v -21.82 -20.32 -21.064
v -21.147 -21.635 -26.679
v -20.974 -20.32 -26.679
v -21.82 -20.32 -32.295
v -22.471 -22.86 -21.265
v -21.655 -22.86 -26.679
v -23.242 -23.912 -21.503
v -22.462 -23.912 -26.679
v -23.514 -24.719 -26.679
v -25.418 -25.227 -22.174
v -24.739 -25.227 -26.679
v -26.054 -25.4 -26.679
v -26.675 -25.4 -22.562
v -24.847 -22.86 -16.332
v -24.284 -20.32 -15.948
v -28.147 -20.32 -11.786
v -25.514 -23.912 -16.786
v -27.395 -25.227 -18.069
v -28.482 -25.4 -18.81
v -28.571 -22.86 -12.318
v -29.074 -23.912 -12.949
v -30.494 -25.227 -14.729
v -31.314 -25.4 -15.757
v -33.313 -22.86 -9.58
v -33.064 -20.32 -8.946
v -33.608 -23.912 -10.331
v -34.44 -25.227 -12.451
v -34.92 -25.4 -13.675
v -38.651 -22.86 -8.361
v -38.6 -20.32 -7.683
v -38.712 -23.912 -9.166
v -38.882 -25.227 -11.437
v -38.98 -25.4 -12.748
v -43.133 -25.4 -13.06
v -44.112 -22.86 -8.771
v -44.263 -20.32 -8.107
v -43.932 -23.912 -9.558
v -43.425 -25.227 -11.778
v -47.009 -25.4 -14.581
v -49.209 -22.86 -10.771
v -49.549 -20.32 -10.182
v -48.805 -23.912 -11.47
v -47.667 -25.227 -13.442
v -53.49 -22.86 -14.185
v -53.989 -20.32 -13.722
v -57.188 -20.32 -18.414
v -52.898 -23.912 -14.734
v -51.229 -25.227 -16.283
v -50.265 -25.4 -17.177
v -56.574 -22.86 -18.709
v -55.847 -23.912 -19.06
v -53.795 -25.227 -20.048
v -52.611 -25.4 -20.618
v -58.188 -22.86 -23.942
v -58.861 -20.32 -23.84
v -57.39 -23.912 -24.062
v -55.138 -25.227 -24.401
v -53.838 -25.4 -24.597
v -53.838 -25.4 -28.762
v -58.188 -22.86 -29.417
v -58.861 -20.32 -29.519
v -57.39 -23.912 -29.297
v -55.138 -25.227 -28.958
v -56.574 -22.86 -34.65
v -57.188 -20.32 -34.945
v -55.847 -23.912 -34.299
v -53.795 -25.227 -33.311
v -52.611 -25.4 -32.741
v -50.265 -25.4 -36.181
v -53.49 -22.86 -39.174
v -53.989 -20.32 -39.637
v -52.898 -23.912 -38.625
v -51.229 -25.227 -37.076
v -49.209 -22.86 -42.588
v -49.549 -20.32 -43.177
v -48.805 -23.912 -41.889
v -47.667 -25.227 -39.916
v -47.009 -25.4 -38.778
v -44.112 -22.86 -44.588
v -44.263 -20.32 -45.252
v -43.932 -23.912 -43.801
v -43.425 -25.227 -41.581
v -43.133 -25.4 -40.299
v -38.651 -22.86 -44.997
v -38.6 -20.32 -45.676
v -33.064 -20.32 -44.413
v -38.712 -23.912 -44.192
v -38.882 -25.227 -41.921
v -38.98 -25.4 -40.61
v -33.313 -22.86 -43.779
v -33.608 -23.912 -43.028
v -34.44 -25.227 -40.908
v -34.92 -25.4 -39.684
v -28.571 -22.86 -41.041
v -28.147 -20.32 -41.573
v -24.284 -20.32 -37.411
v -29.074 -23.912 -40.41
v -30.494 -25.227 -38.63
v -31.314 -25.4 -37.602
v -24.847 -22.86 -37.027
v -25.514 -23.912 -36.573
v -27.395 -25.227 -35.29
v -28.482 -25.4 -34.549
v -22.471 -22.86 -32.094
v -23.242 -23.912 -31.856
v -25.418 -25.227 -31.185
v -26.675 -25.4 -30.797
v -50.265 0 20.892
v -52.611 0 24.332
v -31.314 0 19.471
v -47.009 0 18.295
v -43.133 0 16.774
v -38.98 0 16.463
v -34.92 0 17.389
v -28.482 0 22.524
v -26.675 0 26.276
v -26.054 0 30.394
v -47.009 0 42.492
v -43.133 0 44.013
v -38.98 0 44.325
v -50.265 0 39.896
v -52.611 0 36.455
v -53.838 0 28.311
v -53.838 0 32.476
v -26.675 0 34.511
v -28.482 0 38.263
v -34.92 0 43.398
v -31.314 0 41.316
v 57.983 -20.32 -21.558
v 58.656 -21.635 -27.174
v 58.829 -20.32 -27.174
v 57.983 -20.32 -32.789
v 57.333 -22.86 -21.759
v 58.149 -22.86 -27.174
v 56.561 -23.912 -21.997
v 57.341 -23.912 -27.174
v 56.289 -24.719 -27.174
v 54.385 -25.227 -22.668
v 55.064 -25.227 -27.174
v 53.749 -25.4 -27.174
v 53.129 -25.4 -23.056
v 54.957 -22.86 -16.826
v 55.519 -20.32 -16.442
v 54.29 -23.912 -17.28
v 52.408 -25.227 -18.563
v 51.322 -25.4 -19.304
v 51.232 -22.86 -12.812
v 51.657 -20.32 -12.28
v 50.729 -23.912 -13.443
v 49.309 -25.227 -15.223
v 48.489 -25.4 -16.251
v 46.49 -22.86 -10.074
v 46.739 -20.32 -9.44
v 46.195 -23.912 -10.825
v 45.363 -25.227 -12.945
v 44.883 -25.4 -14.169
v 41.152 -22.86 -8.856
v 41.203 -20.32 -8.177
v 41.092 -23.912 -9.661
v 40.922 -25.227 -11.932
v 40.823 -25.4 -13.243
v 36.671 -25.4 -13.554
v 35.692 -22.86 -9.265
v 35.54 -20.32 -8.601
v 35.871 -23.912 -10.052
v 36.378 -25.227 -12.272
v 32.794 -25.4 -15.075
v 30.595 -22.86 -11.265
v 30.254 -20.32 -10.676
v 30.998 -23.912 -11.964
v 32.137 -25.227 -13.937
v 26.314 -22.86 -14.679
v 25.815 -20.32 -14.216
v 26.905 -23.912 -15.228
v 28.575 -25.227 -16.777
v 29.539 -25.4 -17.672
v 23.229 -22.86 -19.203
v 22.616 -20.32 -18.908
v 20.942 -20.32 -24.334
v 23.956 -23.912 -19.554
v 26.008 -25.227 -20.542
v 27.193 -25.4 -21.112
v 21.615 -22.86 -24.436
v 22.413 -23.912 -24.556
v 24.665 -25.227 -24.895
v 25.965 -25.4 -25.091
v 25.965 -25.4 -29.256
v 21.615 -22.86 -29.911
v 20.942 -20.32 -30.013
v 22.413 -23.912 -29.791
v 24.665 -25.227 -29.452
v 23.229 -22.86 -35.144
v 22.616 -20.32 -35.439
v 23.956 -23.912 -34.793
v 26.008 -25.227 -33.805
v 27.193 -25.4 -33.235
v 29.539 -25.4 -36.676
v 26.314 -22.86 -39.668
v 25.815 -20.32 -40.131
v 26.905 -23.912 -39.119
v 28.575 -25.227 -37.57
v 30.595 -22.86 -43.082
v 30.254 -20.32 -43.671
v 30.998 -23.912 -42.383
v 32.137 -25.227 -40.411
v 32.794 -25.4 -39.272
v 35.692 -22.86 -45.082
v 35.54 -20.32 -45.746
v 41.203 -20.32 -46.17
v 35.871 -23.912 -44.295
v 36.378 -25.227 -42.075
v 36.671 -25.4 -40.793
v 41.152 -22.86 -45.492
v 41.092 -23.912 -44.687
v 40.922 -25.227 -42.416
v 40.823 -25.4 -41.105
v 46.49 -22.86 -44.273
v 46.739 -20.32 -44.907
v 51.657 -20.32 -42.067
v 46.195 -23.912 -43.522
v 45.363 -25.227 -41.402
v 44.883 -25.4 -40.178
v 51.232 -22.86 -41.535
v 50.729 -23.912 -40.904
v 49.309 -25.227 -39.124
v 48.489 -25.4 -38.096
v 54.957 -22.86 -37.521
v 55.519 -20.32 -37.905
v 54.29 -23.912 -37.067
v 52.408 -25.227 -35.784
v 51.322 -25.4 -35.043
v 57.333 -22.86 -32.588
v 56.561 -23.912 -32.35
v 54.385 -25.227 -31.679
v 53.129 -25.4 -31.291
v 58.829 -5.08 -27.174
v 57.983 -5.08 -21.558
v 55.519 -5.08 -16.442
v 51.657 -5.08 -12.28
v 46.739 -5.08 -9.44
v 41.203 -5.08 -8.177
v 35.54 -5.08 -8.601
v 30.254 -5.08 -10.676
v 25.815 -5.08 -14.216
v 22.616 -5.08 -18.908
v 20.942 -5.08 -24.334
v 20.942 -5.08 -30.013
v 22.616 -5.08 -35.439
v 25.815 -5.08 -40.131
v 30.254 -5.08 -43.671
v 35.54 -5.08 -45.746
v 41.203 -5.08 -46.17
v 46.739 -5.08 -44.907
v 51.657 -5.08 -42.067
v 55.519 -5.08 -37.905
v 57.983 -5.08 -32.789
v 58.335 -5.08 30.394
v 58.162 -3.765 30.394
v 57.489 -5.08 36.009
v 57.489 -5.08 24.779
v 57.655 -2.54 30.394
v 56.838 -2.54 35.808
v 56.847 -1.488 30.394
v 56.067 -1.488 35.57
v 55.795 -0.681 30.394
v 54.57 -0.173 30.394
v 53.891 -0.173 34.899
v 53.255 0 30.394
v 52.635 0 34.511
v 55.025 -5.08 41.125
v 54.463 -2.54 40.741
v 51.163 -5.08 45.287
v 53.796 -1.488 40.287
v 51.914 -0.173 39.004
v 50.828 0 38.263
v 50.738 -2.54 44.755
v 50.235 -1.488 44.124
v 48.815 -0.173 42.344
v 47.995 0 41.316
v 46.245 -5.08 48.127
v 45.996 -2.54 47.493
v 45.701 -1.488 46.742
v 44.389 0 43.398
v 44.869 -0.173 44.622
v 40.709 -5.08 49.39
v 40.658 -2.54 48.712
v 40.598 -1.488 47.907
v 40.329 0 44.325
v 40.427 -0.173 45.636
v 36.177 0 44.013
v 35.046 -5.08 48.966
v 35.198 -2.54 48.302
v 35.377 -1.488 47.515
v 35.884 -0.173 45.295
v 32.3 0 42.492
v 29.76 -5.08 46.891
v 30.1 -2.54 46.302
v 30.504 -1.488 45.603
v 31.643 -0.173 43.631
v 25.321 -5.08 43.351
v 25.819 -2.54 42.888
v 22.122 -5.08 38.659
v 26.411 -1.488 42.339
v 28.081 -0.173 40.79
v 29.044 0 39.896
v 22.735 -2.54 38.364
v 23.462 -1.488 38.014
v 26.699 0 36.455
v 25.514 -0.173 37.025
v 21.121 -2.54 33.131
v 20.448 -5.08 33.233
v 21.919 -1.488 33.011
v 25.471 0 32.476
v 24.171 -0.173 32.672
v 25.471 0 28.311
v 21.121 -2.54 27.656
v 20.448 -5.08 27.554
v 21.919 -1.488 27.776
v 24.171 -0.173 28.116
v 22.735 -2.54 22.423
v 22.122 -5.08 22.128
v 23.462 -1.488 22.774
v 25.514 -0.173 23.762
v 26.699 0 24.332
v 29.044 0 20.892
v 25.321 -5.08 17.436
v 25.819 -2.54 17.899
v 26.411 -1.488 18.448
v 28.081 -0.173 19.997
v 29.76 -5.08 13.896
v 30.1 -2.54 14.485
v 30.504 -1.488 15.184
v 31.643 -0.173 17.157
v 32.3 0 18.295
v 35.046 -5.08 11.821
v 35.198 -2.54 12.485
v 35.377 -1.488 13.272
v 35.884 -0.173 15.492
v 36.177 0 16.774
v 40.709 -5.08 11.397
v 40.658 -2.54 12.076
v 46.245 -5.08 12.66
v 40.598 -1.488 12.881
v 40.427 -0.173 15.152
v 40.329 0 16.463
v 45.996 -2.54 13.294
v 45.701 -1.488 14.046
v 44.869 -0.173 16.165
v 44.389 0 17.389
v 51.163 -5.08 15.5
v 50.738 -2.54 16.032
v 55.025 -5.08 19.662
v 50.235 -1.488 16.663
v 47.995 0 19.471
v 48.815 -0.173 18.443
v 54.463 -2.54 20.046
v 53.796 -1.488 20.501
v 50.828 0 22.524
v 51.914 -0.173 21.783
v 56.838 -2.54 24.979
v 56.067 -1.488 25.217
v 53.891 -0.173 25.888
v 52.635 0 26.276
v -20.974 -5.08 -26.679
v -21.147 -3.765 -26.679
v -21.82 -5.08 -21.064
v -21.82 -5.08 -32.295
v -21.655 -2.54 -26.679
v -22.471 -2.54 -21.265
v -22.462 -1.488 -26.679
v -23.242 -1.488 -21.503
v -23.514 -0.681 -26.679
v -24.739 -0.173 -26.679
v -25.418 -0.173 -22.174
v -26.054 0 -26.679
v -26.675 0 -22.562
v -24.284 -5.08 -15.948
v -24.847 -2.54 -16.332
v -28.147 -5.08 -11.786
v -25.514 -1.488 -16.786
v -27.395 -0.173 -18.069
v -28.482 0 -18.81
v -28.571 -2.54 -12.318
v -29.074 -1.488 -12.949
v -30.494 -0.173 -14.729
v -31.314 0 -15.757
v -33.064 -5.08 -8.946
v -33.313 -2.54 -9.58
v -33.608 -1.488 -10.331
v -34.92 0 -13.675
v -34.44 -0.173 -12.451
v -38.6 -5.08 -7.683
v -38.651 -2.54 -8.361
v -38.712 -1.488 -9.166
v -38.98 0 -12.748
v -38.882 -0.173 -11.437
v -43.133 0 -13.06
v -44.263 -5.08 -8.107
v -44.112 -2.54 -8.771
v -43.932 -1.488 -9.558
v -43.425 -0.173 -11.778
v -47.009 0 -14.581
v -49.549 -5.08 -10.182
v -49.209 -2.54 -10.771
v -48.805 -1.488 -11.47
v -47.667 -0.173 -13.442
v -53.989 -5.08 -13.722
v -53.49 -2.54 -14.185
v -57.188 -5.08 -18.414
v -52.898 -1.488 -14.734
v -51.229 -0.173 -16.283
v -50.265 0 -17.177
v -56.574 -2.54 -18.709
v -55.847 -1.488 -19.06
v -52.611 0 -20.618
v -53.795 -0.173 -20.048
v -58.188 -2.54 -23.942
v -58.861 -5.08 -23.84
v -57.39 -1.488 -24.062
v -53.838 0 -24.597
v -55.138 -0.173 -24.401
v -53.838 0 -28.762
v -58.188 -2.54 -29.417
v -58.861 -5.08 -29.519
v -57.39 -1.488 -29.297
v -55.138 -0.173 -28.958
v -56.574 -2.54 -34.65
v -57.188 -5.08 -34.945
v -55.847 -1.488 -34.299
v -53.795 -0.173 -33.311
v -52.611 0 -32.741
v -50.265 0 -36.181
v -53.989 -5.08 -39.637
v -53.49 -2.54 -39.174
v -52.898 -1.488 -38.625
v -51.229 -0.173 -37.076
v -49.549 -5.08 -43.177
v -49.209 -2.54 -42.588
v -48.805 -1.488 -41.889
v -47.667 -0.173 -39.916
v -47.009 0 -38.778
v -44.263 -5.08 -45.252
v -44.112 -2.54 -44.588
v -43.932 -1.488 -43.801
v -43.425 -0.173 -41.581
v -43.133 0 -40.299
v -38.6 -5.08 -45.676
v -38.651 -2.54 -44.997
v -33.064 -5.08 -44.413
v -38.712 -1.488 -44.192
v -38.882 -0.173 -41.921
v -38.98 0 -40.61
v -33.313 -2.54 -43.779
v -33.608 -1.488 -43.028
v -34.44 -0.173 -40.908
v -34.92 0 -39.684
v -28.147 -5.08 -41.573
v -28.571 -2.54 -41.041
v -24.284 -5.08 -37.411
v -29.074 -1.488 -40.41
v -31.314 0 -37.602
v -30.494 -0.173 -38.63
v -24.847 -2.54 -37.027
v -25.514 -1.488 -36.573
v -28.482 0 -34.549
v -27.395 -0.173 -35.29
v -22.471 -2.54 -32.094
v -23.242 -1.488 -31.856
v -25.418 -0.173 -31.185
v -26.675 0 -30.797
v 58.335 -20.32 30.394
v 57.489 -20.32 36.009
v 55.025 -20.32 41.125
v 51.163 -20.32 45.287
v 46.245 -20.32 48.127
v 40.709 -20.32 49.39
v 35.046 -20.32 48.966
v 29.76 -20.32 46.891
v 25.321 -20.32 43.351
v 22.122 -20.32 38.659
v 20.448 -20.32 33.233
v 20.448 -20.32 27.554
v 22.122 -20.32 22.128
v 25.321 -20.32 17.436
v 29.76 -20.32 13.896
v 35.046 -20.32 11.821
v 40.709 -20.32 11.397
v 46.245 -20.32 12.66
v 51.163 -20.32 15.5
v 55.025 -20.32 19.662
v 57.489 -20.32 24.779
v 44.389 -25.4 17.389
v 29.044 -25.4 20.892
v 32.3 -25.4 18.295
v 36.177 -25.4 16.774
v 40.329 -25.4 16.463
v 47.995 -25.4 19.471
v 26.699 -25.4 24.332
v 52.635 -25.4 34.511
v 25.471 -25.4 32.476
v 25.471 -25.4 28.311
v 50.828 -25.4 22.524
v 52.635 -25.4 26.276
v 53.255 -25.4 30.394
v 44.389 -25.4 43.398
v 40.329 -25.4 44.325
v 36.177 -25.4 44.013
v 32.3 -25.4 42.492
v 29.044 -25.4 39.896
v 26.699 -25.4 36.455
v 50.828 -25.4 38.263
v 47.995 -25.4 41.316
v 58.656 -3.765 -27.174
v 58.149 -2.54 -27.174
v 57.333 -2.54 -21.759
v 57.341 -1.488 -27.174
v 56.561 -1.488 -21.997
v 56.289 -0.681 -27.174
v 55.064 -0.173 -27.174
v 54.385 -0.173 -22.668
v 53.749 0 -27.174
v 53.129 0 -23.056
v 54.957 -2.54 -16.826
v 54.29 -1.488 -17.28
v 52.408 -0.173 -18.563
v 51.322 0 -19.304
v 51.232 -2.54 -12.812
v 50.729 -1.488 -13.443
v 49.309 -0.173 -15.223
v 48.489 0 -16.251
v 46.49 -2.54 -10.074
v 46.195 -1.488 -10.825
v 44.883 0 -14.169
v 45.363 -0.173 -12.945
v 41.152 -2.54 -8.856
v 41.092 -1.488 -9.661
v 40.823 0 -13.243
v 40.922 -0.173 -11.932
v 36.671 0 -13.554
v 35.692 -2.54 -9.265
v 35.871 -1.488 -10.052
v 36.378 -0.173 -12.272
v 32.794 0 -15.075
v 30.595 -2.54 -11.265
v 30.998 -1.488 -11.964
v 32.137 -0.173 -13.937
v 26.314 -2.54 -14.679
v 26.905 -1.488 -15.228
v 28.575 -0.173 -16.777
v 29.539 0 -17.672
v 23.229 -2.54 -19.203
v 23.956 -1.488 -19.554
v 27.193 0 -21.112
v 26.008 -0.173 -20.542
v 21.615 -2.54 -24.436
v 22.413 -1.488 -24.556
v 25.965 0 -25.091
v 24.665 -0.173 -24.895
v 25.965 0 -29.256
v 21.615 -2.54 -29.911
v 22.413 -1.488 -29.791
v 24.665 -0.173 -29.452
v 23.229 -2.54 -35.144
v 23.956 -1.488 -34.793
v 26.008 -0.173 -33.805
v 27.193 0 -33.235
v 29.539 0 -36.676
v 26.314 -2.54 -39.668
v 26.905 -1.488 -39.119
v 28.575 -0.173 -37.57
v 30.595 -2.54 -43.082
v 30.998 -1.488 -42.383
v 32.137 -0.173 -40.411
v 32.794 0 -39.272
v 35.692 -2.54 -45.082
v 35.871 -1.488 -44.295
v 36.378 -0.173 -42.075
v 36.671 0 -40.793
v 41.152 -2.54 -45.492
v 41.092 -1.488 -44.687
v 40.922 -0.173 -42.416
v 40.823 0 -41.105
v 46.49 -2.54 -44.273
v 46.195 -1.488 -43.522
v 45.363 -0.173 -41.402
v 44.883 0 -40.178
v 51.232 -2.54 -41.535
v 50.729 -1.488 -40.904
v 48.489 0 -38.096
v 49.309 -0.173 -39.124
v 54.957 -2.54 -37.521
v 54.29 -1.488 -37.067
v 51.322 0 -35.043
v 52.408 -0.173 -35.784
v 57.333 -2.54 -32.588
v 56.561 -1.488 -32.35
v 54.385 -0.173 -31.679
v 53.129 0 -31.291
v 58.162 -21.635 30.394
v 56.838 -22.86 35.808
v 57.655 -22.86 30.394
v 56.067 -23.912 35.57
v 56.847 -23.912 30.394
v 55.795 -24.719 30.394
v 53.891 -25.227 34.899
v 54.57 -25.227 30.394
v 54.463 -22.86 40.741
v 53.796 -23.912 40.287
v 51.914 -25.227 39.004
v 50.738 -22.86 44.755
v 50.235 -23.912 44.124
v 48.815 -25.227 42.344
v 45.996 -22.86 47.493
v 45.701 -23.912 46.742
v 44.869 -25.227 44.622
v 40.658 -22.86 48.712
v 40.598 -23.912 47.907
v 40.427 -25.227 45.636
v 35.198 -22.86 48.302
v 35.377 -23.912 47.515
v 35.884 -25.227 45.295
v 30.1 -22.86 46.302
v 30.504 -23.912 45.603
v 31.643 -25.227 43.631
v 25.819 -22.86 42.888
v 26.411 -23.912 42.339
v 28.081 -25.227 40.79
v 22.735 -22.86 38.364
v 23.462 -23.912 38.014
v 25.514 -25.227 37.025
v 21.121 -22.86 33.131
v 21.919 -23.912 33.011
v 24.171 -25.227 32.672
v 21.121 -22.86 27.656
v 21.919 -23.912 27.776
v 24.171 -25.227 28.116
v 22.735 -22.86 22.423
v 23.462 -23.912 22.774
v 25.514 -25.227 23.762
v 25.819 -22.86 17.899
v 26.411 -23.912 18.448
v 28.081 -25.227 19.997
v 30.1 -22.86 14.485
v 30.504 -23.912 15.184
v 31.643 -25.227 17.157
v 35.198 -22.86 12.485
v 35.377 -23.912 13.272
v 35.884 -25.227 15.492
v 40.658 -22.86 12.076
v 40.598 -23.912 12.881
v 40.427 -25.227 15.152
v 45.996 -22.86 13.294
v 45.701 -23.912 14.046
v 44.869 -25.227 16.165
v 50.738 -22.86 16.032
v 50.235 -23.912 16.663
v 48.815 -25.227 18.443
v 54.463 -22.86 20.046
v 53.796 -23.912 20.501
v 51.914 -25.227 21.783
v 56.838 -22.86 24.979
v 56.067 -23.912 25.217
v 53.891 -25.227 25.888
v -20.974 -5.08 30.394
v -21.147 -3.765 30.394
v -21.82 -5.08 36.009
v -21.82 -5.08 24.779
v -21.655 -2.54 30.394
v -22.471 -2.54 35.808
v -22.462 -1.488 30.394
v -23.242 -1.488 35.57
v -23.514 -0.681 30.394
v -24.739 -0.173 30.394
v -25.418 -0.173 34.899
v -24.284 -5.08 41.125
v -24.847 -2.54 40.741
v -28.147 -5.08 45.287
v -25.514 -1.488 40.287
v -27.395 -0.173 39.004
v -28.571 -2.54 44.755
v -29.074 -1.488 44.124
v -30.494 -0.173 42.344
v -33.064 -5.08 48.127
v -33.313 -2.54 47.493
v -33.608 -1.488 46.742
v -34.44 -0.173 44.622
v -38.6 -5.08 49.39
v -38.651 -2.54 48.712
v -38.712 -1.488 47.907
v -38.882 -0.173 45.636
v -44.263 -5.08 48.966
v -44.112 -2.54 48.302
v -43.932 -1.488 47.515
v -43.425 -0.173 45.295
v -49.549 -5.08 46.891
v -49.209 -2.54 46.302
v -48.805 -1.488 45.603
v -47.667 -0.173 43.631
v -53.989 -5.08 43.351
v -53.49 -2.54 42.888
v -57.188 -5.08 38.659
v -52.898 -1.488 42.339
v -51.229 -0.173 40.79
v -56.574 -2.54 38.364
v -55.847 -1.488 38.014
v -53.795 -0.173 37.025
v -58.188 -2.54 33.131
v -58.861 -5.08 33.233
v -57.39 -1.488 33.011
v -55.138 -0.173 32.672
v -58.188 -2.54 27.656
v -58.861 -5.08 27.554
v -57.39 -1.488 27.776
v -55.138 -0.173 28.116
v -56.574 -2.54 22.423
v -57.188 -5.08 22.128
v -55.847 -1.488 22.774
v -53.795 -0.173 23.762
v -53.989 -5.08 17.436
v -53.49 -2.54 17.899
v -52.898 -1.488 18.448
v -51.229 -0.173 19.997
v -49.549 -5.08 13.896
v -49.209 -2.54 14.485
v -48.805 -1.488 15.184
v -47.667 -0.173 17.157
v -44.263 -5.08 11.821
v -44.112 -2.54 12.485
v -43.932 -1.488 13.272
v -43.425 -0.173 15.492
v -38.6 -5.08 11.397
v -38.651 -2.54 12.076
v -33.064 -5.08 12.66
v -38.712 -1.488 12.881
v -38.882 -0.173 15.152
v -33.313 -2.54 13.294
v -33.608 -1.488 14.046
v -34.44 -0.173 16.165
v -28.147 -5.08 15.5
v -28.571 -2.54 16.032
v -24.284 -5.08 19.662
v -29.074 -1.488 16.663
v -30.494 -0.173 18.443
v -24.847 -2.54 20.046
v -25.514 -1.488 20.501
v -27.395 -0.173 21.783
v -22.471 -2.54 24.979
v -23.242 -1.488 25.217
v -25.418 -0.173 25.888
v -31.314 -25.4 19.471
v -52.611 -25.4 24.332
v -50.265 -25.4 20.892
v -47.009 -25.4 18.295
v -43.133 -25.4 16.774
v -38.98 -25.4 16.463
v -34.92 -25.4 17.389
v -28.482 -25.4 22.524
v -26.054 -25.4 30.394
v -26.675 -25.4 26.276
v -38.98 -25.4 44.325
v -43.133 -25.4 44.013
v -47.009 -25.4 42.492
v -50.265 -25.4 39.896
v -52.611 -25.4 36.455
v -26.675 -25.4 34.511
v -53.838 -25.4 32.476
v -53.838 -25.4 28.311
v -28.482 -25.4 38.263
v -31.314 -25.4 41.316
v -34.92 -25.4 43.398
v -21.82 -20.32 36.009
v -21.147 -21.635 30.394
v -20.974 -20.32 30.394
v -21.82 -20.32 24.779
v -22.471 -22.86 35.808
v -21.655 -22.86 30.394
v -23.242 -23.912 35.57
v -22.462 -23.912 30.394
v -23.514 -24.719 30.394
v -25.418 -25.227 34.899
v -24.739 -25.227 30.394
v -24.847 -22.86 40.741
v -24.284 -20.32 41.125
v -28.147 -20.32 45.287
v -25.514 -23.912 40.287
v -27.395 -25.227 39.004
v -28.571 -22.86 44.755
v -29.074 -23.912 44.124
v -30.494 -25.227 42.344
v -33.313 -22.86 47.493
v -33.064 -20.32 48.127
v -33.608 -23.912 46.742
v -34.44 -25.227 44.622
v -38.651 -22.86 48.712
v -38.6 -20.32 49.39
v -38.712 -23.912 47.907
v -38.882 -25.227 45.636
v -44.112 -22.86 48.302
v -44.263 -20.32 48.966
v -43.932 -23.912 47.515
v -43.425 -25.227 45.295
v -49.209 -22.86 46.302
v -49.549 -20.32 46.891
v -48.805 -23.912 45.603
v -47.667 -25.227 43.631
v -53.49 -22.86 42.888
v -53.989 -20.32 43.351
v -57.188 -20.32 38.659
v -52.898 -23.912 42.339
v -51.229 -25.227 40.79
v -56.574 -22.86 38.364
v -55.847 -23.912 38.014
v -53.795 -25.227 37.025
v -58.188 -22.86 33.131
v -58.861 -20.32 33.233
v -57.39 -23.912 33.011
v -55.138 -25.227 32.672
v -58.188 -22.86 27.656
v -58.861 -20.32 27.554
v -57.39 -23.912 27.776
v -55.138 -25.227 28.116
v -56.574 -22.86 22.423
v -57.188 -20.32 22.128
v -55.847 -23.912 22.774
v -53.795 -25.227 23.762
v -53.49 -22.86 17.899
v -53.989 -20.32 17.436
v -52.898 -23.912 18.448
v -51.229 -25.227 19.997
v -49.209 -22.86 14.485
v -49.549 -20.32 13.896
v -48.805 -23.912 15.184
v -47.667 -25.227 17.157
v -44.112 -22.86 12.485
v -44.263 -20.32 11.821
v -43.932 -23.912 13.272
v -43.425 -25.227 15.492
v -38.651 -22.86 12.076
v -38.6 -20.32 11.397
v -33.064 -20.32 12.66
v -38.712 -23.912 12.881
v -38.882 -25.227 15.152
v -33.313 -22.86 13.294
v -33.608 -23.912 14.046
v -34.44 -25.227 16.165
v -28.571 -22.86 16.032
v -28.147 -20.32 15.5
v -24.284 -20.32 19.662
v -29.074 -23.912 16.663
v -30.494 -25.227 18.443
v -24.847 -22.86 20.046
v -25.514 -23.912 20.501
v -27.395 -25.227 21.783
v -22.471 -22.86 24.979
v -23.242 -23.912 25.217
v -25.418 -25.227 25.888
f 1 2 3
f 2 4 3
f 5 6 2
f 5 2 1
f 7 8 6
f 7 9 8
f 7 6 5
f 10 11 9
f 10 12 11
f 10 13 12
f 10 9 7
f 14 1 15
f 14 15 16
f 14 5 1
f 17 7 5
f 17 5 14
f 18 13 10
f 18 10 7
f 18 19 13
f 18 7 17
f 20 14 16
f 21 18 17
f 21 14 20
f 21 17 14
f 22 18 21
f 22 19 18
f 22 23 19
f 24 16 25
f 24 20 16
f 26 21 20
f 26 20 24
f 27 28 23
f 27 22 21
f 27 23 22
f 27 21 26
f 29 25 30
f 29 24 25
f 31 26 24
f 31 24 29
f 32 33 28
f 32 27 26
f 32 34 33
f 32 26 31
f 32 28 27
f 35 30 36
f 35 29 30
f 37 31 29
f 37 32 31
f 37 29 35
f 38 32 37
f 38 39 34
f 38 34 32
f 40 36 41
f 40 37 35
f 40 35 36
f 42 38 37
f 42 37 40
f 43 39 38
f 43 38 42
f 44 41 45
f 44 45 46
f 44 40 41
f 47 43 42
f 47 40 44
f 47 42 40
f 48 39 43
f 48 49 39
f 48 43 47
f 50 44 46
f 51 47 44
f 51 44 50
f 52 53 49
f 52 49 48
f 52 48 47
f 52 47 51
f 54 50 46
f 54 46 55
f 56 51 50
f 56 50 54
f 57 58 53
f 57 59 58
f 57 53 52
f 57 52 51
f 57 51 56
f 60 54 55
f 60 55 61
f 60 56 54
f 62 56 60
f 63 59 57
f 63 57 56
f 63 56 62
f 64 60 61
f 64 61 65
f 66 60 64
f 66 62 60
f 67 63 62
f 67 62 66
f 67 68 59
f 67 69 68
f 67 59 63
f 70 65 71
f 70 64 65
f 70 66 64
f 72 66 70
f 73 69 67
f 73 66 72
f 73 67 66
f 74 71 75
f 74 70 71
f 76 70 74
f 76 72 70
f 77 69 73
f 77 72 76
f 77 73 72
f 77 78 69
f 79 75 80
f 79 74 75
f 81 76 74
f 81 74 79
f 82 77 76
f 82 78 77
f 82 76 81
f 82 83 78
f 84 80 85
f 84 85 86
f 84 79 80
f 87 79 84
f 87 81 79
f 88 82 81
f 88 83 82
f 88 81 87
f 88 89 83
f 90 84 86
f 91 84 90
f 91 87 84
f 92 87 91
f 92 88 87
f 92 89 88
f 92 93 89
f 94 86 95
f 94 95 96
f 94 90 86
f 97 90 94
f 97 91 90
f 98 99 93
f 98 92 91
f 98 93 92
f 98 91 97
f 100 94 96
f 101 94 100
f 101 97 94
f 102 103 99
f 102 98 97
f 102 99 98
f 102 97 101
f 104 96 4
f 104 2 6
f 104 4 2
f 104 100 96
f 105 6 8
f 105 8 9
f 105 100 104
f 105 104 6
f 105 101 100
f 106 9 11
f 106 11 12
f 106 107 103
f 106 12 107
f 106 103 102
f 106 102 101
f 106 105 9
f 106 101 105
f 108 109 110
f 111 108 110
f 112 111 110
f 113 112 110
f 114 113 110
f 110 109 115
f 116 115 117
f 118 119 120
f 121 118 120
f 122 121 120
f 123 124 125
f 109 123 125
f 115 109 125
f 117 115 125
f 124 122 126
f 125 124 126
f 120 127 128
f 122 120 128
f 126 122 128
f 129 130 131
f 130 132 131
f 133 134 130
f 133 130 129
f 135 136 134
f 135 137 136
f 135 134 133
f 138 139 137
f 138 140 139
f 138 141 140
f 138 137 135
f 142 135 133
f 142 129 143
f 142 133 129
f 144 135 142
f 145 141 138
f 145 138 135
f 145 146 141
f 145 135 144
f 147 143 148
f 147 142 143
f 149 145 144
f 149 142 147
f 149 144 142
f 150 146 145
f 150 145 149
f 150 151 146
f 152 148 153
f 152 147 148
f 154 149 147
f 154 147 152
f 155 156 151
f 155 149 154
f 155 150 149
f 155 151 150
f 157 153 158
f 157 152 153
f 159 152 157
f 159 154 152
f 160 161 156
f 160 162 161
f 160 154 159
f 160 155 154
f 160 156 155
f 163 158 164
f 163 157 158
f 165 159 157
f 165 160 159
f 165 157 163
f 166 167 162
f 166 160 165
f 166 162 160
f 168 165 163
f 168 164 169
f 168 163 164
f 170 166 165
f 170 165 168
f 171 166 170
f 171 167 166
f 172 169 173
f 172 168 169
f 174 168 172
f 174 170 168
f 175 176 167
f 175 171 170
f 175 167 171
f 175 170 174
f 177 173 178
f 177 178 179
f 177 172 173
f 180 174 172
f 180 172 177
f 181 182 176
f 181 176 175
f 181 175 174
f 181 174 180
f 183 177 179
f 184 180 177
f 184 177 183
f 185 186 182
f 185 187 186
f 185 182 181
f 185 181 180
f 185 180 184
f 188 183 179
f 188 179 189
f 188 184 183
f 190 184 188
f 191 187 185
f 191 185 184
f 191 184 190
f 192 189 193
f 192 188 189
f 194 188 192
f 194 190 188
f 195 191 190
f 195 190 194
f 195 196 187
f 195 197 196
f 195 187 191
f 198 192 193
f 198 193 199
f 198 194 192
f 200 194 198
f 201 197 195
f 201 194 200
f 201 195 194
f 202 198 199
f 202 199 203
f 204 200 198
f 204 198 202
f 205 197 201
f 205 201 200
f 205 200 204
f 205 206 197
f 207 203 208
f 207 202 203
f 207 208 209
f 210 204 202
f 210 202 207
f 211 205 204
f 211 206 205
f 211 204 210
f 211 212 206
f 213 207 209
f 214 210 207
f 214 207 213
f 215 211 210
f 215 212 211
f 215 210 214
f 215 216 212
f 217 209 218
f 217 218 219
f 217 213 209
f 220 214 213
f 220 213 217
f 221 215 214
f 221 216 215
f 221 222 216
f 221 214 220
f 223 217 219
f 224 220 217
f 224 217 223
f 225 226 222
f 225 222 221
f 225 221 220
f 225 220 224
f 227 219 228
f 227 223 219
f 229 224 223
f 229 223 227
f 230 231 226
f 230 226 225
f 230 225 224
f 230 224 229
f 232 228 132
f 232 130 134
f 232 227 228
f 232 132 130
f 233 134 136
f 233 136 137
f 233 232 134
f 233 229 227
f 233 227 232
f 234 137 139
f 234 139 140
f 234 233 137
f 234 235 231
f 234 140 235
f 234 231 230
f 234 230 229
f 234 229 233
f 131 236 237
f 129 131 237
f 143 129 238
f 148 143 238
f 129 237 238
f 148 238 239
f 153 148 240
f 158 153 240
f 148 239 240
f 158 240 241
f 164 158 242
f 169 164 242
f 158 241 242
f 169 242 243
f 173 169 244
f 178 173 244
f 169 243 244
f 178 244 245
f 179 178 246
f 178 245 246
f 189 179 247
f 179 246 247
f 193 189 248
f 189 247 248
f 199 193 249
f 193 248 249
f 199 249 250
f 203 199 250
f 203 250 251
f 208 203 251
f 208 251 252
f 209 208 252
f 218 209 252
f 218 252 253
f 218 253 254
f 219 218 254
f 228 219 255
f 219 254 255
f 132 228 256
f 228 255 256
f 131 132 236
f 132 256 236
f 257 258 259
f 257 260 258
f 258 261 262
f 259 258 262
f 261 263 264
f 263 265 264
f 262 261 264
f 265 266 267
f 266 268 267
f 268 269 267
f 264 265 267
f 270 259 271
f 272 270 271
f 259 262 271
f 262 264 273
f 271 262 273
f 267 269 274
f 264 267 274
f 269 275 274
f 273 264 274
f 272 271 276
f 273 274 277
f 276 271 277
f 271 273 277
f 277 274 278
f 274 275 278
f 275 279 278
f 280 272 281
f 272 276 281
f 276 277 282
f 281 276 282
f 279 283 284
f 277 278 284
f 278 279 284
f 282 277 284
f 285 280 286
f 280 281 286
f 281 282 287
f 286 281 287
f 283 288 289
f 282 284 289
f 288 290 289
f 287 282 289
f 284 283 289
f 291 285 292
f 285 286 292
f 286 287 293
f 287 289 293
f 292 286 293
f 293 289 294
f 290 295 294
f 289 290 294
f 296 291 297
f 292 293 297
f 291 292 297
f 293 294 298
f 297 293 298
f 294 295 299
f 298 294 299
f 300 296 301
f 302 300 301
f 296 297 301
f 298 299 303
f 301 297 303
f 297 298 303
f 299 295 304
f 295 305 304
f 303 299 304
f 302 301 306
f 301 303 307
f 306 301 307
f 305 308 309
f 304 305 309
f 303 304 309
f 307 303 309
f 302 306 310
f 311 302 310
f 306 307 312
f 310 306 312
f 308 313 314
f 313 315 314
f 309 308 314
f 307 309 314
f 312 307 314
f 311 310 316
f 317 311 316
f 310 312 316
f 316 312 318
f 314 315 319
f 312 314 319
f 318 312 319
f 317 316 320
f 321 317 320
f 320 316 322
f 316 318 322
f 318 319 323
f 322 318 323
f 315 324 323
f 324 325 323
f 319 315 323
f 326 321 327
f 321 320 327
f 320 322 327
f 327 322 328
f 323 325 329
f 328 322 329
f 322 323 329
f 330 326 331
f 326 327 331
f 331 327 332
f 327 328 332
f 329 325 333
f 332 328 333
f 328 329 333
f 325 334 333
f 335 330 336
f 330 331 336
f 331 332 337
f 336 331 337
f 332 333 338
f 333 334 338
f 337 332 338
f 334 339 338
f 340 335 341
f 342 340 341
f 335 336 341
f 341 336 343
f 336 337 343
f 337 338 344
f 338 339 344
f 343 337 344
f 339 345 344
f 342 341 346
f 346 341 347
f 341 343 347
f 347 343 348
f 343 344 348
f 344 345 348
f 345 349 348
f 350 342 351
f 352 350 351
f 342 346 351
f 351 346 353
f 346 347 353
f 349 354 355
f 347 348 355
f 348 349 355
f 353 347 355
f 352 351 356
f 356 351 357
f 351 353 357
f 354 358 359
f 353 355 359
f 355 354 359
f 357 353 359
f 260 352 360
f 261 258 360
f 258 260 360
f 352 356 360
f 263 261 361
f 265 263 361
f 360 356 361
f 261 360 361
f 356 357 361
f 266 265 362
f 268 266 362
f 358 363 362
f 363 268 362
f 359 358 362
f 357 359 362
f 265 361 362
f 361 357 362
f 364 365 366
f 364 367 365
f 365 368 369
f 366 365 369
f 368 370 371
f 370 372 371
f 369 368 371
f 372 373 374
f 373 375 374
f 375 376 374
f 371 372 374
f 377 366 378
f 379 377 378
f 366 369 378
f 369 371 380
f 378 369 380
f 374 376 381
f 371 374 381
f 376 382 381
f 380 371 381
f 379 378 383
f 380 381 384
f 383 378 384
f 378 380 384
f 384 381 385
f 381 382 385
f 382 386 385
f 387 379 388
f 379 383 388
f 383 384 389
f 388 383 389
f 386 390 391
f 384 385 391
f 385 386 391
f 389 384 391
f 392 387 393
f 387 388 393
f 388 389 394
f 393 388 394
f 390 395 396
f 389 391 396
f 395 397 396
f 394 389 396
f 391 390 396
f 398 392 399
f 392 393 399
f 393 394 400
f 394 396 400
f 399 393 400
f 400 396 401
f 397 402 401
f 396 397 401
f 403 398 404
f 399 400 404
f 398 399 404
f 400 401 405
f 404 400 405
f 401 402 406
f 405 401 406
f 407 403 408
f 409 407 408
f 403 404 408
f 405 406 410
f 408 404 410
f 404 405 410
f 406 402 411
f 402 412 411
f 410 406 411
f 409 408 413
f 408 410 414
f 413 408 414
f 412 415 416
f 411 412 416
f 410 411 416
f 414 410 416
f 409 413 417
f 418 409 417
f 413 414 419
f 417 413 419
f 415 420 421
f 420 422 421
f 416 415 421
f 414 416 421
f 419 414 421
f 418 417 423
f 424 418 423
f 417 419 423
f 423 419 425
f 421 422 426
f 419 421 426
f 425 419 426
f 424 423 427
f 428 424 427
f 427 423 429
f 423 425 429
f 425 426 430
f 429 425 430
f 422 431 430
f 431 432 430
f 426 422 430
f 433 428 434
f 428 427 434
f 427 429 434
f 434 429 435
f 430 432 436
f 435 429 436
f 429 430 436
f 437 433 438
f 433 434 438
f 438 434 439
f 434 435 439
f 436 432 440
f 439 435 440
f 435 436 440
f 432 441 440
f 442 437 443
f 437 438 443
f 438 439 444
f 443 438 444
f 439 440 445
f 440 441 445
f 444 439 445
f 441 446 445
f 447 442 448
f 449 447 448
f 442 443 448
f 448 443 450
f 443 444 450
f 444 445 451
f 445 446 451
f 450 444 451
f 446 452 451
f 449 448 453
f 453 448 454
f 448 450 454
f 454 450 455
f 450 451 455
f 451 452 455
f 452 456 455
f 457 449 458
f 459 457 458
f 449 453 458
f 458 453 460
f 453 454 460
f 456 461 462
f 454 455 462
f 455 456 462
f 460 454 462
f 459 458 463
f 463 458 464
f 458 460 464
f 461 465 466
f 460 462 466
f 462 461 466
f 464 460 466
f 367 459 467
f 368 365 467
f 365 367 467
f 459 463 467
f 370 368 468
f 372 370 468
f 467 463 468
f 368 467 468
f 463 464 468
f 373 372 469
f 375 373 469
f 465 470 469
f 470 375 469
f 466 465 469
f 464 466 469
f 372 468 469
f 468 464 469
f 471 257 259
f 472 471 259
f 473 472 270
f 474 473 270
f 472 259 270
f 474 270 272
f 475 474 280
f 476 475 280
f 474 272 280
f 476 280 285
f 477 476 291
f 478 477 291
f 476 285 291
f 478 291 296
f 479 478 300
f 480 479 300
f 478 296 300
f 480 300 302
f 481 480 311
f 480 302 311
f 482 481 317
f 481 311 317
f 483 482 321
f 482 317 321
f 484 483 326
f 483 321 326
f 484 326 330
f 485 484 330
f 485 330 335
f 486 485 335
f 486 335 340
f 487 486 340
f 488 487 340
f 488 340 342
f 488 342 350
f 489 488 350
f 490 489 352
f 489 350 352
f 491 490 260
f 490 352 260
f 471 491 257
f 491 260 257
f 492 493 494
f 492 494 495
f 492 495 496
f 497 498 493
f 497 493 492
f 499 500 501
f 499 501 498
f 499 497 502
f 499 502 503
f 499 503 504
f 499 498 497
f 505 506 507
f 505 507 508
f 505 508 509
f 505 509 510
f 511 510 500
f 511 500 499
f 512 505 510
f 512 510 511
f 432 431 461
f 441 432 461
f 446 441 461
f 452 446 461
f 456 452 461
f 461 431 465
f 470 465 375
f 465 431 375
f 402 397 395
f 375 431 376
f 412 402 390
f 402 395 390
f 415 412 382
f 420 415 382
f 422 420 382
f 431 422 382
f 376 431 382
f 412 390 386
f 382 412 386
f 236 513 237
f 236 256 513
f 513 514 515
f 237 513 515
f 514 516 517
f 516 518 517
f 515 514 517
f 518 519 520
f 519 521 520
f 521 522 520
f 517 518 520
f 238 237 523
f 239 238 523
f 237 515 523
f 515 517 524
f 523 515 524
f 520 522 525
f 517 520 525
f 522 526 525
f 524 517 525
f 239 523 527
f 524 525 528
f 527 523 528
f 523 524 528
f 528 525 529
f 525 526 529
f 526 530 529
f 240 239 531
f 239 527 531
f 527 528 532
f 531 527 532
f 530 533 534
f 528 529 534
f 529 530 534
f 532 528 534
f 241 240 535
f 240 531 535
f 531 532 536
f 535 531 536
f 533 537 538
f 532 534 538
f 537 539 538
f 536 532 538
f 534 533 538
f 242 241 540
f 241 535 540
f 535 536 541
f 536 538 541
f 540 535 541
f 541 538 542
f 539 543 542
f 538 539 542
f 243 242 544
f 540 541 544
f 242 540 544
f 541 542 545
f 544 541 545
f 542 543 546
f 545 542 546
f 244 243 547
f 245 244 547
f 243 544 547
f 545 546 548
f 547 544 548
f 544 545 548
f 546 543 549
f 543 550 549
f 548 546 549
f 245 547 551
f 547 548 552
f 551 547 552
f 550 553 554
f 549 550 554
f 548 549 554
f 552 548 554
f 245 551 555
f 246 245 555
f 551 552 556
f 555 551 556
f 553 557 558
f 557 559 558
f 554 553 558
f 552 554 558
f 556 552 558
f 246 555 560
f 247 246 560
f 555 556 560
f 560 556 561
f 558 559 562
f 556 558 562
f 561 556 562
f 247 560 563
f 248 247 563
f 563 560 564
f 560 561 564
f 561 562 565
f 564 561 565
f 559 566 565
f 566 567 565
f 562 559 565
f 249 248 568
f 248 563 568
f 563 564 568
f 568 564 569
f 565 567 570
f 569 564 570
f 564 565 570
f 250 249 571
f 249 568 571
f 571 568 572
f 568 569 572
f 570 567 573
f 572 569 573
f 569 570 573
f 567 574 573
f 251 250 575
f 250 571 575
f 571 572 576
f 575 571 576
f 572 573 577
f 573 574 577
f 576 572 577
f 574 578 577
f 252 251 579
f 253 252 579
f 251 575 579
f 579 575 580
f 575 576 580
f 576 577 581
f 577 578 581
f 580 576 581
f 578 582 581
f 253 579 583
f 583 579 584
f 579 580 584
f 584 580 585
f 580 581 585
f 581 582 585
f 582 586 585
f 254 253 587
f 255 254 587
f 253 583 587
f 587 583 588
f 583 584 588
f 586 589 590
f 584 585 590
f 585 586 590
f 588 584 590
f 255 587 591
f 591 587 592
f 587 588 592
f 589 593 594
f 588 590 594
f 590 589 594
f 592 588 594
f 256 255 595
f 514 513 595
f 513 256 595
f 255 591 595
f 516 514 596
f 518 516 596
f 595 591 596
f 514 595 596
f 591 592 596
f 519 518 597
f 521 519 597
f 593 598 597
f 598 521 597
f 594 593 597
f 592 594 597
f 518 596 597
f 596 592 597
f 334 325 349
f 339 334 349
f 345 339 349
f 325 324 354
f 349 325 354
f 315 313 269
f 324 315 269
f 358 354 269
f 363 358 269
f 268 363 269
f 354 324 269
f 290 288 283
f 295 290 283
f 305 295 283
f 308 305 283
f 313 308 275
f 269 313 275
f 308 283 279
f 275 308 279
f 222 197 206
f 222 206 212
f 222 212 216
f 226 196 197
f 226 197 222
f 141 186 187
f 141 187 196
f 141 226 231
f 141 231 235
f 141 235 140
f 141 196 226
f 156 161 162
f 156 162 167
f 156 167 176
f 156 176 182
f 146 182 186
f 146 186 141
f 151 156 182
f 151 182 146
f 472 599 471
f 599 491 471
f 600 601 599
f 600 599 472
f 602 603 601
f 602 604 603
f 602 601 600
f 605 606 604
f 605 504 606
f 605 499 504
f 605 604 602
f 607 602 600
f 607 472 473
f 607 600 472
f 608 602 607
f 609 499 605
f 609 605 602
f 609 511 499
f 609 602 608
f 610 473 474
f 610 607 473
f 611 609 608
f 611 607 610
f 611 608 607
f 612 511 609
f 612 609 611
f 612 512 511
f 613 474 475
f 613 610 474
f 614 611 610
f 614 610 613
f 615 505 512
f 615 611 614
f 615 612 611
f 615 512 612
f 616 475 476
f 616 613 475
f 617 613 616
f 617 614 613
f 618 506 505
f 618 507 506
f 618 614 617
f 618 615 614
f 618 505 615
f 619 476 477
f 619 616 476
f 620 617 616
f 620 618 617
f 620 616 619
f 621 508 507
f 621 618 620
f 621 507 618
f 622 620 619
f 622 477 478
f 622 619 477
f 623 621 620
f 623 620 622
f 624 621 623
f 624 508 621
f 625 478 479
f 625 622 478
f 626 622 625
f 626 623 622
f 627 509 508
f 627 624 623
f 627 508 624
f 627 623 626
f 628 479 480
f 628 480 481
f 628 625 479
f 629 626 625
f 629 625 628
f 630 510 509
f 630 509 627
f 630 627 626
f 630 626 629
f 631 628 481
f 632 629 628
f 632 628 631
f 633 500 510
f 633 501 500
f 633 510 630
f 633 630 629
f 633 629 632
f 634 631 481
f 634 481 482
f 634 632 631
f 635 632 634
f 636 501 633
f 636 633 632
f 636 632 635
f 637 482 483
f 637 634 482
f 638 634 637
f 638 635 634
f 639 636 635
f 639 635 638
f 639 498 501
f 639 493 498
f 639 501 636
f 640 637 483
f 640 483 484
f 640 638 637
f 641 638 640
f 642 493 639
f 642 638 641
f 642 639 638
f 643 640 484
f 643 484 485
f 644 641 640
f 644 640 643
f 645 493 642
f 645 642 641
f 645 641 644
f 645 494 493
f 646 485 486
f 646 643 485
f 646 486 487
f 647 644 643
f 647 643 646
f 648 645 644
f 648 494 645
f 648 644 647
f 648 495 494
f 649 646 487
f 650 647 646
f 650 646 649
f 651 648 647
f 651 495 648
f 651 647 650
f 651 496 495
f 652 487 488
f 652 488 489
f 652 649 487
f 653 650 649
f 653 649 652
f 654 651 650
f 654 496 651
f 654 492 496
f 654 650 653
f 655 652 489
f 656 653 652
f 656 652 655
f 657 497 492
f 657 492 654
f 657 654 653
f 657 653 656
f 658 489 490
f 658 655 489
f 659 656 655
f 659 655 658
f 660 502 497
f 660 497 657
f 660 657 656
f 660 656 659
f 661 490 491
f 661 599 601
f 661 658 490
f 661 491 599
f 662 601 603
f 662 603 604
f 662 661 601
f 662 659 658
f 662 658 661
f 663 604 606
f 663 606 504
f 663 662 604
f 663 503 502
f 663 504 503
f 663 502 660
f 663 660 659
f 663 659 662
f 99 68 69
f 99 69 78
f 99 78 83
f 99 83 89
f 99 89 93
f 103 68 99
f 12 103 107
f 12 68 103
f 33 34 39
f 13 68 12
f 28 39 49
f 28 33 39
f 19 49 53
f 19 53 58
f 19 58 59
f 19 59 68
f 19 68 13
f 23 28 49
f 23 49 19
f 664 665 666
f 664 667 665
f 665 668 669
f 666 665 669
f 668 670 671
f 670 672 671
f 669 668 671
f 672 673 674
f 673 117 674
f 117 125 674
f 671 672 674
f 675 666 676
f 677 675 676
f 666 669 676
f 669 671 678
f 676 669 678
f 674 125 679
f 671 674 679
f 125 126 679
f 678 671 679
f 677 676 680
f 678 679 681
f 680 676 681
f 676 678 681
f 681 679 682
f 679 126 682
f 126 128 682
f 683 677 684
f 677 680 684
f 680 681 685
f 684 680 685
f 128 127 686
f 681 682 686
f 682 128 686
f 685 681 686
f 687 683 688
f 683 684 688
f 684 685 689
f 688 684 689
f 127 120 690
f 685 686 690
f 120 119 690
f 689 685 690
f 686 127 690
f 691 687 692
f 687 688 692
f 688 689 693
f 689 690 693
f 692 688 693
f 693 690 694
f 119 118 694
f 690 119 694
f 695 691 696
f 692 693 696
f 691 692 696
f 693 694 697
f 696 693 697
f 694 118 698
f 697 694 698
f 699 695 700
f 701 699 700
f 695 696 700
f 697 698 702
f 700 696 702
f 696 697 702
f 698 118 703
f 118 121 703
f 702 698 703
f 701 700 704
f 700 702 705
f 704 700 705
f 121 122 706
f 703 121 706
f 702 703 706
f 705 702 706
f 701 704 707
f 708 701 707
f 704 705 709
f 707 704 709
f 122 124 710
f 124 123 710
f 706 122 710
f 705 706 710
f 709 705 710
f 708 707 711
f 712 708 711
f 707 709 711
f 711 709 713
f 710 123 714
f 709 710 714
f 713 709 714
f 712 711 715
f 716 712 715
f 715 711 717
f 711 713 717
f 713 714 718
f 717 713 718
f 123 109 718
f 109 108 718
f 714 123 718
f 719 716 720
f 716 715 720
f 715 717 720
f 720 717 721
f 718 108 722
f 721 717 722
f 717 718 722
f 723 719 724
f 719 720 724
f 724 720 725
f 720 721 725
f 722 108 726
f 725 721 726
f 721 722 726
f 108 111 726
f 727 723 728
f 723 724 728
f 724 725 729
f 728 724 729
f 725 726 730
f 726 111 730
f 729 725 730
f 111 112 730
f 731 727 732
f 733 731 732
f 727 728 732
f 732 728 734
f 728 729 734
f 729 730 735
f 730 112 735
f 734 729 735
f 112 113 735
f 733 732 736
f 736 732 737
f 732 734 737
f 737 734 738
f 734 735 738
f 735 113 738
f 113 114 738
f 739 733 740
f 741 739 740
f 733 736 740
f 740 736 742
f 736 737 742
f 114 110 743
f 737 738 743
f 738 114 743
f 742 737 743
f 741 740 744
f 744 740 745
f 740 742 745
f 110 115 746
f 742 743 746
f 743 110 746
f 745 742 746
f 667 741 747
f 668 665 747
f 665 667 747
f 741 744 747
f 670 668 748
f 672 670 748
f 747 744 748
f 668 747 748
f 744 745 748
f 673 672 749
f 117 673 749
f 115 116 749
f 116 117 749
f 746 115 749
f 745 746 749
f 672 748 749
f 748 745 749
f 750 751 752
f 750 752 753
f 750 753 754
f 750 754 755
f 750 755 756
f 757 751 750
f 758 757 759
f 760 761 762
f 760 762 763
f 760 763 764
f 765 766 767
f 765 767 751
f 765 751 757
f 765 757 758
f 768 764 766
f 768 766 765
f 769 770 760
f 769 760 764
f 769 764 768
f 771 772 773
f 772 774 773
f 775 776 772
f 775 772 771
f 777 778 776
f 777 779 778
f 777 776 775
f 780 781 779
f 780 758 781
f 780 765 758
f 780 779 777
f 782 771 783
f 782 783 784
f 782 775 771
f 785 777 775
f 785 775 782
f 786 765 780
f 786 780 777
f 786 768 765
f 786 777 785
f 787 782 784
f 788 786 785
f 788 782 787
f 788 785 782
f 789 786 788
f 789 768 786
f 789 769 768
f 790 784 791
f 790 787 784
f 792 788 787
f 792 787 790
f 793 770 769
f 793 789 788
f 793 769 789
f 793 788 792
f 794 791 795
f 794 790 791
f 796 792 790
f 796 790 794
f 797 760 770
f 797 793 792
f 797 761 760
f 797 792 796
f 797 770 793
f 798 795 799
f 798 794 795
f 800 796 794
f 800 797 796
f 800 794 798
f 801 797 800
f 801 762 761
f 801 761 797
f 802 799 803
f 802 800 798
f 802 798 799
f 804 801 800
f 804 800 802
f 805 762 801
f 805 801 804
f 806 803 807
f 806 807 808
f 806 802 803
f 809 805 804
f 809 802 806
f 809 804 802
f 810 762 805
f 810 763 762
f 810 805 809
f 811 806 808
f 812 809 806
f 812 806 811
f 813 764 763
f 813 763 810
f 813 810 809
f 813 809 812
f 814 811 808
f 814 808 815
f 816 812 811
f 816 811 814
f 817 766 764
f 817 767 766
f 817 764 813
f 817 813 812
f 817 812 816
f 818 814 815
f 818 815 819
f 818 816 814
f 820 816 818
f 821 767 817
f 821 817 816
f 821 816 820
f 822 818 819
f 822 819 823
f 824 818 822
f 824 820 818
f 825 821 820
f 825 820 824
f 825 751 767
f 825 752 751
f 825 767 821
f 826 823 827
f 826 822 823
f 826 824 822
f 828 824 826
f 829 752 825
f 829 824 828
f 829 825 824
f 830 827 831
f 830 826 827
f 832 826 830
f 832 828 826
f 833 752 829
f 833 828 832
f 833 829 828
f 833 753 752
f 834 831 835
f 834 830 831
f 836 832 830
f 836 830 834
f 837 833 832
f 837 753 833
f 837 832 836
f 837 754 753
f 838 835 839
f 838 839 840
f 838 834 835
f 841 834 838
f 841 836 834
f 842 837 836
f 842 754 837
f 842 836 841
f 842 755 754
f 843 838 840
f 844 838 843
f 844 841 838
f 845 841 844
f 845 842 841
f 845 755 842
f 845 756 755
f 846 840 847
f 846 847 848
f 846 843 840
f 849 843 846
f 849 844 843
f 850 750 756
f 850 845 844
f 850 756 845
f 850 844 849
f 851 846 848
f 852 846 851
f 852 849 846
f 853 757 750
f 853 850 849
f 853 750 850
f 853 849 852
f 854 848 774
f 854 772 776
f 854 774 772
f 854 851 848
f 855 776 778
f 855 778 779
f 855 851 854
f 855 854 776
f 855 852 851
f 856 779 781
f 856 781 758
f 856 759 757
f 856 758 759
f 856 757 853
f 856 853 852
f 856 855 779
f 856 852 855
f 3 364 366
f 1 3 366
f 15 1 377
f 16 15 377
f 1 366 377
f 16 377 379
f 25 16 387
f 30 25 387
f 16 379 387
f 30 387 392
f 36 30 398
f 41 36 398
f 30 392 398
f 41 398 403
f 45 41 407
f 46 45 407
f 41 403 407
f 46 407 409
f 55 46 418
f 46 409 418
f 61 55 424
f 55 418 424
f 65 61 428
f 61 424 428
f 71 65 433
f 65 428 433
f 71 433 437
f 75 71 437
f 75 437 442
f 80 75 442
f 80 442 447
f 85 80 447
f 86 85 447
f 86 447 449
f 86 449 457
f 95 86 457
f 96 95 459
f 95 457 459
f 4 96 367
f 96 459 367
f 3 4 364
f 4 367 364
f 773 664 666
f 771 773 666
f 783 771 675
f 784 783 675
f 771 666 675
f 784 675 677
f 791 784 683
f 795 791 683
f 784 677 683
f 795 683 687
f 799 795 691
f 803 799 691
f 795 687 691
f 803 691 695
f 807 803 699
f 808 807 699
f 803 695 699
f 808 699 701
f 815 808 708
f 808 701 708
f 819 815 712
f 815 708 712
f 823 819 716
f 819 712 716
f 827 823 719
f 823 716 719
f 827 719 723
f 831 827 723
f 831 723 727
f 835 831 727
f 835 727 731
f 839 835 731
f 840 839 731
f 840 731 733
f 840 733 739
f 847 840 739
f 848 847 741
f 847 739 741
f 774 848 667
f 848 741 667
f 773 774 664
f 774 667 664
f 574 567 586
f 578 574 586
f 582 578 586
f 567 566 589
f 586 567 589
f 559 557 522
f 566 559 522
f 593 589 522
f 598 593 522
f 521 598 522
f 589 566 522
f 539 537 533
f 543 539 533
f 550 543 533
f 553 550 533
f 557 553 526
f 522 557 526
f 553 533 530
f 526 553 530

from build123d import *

# Parameters (mm, degrees)
F0_R     = 19.05
F1_DEPTH = 25.4
F2_R     = 5.08
F3_R     = 5.08
F4_R     = 5.08


with BuildPart() as f1:
    # F0 (on Front) → F1 (new body)
    with BuildSketch(Plane.XZ):
        with Locations((-40.024104, 30.393604)):
            Circle(F0_R)
        with Locations((39.285175, 30.393604)):
            Circle(F0_R)
        with Locations((-40.024104, -26.679428)):
            Circle(F0_R)
        with Locations((39.779316, -27.173568)):
            Circle(F0_R)
    extrude(amount=F1_DEPTH)

    # F2
    f2_edges = [f1.edges().sort_by_distance(p)[0] for p in [
        (-59.074104, -25.4, 30.393604),
        (20.235175, -25.4, 30.393604),
        (-59.074104, -25.4, -26.679428),
        (20.729316, -25.4, -27.173568),
    ]]
    fillet(f2_edges, radius=F2_R)

    # F3
    f3_edges = [f1.edges().sort_by_distance(p)[0] for p in [
        (-59.074104, 0, -26.679428),
        (20.729316, 0, -27.173568),
        (-59.074104, 0, 30.393604),
    ]]
    fillet(f3_edges, radius=F3_R)

    # F4
    f4_edges = [f1.edges().sort_by_distance(p)[0] for p in [
        (20.235175, 0, 30.393604),
    ]]
    fillet(f4_edges, radius=F4_R)


solid = f1.part
